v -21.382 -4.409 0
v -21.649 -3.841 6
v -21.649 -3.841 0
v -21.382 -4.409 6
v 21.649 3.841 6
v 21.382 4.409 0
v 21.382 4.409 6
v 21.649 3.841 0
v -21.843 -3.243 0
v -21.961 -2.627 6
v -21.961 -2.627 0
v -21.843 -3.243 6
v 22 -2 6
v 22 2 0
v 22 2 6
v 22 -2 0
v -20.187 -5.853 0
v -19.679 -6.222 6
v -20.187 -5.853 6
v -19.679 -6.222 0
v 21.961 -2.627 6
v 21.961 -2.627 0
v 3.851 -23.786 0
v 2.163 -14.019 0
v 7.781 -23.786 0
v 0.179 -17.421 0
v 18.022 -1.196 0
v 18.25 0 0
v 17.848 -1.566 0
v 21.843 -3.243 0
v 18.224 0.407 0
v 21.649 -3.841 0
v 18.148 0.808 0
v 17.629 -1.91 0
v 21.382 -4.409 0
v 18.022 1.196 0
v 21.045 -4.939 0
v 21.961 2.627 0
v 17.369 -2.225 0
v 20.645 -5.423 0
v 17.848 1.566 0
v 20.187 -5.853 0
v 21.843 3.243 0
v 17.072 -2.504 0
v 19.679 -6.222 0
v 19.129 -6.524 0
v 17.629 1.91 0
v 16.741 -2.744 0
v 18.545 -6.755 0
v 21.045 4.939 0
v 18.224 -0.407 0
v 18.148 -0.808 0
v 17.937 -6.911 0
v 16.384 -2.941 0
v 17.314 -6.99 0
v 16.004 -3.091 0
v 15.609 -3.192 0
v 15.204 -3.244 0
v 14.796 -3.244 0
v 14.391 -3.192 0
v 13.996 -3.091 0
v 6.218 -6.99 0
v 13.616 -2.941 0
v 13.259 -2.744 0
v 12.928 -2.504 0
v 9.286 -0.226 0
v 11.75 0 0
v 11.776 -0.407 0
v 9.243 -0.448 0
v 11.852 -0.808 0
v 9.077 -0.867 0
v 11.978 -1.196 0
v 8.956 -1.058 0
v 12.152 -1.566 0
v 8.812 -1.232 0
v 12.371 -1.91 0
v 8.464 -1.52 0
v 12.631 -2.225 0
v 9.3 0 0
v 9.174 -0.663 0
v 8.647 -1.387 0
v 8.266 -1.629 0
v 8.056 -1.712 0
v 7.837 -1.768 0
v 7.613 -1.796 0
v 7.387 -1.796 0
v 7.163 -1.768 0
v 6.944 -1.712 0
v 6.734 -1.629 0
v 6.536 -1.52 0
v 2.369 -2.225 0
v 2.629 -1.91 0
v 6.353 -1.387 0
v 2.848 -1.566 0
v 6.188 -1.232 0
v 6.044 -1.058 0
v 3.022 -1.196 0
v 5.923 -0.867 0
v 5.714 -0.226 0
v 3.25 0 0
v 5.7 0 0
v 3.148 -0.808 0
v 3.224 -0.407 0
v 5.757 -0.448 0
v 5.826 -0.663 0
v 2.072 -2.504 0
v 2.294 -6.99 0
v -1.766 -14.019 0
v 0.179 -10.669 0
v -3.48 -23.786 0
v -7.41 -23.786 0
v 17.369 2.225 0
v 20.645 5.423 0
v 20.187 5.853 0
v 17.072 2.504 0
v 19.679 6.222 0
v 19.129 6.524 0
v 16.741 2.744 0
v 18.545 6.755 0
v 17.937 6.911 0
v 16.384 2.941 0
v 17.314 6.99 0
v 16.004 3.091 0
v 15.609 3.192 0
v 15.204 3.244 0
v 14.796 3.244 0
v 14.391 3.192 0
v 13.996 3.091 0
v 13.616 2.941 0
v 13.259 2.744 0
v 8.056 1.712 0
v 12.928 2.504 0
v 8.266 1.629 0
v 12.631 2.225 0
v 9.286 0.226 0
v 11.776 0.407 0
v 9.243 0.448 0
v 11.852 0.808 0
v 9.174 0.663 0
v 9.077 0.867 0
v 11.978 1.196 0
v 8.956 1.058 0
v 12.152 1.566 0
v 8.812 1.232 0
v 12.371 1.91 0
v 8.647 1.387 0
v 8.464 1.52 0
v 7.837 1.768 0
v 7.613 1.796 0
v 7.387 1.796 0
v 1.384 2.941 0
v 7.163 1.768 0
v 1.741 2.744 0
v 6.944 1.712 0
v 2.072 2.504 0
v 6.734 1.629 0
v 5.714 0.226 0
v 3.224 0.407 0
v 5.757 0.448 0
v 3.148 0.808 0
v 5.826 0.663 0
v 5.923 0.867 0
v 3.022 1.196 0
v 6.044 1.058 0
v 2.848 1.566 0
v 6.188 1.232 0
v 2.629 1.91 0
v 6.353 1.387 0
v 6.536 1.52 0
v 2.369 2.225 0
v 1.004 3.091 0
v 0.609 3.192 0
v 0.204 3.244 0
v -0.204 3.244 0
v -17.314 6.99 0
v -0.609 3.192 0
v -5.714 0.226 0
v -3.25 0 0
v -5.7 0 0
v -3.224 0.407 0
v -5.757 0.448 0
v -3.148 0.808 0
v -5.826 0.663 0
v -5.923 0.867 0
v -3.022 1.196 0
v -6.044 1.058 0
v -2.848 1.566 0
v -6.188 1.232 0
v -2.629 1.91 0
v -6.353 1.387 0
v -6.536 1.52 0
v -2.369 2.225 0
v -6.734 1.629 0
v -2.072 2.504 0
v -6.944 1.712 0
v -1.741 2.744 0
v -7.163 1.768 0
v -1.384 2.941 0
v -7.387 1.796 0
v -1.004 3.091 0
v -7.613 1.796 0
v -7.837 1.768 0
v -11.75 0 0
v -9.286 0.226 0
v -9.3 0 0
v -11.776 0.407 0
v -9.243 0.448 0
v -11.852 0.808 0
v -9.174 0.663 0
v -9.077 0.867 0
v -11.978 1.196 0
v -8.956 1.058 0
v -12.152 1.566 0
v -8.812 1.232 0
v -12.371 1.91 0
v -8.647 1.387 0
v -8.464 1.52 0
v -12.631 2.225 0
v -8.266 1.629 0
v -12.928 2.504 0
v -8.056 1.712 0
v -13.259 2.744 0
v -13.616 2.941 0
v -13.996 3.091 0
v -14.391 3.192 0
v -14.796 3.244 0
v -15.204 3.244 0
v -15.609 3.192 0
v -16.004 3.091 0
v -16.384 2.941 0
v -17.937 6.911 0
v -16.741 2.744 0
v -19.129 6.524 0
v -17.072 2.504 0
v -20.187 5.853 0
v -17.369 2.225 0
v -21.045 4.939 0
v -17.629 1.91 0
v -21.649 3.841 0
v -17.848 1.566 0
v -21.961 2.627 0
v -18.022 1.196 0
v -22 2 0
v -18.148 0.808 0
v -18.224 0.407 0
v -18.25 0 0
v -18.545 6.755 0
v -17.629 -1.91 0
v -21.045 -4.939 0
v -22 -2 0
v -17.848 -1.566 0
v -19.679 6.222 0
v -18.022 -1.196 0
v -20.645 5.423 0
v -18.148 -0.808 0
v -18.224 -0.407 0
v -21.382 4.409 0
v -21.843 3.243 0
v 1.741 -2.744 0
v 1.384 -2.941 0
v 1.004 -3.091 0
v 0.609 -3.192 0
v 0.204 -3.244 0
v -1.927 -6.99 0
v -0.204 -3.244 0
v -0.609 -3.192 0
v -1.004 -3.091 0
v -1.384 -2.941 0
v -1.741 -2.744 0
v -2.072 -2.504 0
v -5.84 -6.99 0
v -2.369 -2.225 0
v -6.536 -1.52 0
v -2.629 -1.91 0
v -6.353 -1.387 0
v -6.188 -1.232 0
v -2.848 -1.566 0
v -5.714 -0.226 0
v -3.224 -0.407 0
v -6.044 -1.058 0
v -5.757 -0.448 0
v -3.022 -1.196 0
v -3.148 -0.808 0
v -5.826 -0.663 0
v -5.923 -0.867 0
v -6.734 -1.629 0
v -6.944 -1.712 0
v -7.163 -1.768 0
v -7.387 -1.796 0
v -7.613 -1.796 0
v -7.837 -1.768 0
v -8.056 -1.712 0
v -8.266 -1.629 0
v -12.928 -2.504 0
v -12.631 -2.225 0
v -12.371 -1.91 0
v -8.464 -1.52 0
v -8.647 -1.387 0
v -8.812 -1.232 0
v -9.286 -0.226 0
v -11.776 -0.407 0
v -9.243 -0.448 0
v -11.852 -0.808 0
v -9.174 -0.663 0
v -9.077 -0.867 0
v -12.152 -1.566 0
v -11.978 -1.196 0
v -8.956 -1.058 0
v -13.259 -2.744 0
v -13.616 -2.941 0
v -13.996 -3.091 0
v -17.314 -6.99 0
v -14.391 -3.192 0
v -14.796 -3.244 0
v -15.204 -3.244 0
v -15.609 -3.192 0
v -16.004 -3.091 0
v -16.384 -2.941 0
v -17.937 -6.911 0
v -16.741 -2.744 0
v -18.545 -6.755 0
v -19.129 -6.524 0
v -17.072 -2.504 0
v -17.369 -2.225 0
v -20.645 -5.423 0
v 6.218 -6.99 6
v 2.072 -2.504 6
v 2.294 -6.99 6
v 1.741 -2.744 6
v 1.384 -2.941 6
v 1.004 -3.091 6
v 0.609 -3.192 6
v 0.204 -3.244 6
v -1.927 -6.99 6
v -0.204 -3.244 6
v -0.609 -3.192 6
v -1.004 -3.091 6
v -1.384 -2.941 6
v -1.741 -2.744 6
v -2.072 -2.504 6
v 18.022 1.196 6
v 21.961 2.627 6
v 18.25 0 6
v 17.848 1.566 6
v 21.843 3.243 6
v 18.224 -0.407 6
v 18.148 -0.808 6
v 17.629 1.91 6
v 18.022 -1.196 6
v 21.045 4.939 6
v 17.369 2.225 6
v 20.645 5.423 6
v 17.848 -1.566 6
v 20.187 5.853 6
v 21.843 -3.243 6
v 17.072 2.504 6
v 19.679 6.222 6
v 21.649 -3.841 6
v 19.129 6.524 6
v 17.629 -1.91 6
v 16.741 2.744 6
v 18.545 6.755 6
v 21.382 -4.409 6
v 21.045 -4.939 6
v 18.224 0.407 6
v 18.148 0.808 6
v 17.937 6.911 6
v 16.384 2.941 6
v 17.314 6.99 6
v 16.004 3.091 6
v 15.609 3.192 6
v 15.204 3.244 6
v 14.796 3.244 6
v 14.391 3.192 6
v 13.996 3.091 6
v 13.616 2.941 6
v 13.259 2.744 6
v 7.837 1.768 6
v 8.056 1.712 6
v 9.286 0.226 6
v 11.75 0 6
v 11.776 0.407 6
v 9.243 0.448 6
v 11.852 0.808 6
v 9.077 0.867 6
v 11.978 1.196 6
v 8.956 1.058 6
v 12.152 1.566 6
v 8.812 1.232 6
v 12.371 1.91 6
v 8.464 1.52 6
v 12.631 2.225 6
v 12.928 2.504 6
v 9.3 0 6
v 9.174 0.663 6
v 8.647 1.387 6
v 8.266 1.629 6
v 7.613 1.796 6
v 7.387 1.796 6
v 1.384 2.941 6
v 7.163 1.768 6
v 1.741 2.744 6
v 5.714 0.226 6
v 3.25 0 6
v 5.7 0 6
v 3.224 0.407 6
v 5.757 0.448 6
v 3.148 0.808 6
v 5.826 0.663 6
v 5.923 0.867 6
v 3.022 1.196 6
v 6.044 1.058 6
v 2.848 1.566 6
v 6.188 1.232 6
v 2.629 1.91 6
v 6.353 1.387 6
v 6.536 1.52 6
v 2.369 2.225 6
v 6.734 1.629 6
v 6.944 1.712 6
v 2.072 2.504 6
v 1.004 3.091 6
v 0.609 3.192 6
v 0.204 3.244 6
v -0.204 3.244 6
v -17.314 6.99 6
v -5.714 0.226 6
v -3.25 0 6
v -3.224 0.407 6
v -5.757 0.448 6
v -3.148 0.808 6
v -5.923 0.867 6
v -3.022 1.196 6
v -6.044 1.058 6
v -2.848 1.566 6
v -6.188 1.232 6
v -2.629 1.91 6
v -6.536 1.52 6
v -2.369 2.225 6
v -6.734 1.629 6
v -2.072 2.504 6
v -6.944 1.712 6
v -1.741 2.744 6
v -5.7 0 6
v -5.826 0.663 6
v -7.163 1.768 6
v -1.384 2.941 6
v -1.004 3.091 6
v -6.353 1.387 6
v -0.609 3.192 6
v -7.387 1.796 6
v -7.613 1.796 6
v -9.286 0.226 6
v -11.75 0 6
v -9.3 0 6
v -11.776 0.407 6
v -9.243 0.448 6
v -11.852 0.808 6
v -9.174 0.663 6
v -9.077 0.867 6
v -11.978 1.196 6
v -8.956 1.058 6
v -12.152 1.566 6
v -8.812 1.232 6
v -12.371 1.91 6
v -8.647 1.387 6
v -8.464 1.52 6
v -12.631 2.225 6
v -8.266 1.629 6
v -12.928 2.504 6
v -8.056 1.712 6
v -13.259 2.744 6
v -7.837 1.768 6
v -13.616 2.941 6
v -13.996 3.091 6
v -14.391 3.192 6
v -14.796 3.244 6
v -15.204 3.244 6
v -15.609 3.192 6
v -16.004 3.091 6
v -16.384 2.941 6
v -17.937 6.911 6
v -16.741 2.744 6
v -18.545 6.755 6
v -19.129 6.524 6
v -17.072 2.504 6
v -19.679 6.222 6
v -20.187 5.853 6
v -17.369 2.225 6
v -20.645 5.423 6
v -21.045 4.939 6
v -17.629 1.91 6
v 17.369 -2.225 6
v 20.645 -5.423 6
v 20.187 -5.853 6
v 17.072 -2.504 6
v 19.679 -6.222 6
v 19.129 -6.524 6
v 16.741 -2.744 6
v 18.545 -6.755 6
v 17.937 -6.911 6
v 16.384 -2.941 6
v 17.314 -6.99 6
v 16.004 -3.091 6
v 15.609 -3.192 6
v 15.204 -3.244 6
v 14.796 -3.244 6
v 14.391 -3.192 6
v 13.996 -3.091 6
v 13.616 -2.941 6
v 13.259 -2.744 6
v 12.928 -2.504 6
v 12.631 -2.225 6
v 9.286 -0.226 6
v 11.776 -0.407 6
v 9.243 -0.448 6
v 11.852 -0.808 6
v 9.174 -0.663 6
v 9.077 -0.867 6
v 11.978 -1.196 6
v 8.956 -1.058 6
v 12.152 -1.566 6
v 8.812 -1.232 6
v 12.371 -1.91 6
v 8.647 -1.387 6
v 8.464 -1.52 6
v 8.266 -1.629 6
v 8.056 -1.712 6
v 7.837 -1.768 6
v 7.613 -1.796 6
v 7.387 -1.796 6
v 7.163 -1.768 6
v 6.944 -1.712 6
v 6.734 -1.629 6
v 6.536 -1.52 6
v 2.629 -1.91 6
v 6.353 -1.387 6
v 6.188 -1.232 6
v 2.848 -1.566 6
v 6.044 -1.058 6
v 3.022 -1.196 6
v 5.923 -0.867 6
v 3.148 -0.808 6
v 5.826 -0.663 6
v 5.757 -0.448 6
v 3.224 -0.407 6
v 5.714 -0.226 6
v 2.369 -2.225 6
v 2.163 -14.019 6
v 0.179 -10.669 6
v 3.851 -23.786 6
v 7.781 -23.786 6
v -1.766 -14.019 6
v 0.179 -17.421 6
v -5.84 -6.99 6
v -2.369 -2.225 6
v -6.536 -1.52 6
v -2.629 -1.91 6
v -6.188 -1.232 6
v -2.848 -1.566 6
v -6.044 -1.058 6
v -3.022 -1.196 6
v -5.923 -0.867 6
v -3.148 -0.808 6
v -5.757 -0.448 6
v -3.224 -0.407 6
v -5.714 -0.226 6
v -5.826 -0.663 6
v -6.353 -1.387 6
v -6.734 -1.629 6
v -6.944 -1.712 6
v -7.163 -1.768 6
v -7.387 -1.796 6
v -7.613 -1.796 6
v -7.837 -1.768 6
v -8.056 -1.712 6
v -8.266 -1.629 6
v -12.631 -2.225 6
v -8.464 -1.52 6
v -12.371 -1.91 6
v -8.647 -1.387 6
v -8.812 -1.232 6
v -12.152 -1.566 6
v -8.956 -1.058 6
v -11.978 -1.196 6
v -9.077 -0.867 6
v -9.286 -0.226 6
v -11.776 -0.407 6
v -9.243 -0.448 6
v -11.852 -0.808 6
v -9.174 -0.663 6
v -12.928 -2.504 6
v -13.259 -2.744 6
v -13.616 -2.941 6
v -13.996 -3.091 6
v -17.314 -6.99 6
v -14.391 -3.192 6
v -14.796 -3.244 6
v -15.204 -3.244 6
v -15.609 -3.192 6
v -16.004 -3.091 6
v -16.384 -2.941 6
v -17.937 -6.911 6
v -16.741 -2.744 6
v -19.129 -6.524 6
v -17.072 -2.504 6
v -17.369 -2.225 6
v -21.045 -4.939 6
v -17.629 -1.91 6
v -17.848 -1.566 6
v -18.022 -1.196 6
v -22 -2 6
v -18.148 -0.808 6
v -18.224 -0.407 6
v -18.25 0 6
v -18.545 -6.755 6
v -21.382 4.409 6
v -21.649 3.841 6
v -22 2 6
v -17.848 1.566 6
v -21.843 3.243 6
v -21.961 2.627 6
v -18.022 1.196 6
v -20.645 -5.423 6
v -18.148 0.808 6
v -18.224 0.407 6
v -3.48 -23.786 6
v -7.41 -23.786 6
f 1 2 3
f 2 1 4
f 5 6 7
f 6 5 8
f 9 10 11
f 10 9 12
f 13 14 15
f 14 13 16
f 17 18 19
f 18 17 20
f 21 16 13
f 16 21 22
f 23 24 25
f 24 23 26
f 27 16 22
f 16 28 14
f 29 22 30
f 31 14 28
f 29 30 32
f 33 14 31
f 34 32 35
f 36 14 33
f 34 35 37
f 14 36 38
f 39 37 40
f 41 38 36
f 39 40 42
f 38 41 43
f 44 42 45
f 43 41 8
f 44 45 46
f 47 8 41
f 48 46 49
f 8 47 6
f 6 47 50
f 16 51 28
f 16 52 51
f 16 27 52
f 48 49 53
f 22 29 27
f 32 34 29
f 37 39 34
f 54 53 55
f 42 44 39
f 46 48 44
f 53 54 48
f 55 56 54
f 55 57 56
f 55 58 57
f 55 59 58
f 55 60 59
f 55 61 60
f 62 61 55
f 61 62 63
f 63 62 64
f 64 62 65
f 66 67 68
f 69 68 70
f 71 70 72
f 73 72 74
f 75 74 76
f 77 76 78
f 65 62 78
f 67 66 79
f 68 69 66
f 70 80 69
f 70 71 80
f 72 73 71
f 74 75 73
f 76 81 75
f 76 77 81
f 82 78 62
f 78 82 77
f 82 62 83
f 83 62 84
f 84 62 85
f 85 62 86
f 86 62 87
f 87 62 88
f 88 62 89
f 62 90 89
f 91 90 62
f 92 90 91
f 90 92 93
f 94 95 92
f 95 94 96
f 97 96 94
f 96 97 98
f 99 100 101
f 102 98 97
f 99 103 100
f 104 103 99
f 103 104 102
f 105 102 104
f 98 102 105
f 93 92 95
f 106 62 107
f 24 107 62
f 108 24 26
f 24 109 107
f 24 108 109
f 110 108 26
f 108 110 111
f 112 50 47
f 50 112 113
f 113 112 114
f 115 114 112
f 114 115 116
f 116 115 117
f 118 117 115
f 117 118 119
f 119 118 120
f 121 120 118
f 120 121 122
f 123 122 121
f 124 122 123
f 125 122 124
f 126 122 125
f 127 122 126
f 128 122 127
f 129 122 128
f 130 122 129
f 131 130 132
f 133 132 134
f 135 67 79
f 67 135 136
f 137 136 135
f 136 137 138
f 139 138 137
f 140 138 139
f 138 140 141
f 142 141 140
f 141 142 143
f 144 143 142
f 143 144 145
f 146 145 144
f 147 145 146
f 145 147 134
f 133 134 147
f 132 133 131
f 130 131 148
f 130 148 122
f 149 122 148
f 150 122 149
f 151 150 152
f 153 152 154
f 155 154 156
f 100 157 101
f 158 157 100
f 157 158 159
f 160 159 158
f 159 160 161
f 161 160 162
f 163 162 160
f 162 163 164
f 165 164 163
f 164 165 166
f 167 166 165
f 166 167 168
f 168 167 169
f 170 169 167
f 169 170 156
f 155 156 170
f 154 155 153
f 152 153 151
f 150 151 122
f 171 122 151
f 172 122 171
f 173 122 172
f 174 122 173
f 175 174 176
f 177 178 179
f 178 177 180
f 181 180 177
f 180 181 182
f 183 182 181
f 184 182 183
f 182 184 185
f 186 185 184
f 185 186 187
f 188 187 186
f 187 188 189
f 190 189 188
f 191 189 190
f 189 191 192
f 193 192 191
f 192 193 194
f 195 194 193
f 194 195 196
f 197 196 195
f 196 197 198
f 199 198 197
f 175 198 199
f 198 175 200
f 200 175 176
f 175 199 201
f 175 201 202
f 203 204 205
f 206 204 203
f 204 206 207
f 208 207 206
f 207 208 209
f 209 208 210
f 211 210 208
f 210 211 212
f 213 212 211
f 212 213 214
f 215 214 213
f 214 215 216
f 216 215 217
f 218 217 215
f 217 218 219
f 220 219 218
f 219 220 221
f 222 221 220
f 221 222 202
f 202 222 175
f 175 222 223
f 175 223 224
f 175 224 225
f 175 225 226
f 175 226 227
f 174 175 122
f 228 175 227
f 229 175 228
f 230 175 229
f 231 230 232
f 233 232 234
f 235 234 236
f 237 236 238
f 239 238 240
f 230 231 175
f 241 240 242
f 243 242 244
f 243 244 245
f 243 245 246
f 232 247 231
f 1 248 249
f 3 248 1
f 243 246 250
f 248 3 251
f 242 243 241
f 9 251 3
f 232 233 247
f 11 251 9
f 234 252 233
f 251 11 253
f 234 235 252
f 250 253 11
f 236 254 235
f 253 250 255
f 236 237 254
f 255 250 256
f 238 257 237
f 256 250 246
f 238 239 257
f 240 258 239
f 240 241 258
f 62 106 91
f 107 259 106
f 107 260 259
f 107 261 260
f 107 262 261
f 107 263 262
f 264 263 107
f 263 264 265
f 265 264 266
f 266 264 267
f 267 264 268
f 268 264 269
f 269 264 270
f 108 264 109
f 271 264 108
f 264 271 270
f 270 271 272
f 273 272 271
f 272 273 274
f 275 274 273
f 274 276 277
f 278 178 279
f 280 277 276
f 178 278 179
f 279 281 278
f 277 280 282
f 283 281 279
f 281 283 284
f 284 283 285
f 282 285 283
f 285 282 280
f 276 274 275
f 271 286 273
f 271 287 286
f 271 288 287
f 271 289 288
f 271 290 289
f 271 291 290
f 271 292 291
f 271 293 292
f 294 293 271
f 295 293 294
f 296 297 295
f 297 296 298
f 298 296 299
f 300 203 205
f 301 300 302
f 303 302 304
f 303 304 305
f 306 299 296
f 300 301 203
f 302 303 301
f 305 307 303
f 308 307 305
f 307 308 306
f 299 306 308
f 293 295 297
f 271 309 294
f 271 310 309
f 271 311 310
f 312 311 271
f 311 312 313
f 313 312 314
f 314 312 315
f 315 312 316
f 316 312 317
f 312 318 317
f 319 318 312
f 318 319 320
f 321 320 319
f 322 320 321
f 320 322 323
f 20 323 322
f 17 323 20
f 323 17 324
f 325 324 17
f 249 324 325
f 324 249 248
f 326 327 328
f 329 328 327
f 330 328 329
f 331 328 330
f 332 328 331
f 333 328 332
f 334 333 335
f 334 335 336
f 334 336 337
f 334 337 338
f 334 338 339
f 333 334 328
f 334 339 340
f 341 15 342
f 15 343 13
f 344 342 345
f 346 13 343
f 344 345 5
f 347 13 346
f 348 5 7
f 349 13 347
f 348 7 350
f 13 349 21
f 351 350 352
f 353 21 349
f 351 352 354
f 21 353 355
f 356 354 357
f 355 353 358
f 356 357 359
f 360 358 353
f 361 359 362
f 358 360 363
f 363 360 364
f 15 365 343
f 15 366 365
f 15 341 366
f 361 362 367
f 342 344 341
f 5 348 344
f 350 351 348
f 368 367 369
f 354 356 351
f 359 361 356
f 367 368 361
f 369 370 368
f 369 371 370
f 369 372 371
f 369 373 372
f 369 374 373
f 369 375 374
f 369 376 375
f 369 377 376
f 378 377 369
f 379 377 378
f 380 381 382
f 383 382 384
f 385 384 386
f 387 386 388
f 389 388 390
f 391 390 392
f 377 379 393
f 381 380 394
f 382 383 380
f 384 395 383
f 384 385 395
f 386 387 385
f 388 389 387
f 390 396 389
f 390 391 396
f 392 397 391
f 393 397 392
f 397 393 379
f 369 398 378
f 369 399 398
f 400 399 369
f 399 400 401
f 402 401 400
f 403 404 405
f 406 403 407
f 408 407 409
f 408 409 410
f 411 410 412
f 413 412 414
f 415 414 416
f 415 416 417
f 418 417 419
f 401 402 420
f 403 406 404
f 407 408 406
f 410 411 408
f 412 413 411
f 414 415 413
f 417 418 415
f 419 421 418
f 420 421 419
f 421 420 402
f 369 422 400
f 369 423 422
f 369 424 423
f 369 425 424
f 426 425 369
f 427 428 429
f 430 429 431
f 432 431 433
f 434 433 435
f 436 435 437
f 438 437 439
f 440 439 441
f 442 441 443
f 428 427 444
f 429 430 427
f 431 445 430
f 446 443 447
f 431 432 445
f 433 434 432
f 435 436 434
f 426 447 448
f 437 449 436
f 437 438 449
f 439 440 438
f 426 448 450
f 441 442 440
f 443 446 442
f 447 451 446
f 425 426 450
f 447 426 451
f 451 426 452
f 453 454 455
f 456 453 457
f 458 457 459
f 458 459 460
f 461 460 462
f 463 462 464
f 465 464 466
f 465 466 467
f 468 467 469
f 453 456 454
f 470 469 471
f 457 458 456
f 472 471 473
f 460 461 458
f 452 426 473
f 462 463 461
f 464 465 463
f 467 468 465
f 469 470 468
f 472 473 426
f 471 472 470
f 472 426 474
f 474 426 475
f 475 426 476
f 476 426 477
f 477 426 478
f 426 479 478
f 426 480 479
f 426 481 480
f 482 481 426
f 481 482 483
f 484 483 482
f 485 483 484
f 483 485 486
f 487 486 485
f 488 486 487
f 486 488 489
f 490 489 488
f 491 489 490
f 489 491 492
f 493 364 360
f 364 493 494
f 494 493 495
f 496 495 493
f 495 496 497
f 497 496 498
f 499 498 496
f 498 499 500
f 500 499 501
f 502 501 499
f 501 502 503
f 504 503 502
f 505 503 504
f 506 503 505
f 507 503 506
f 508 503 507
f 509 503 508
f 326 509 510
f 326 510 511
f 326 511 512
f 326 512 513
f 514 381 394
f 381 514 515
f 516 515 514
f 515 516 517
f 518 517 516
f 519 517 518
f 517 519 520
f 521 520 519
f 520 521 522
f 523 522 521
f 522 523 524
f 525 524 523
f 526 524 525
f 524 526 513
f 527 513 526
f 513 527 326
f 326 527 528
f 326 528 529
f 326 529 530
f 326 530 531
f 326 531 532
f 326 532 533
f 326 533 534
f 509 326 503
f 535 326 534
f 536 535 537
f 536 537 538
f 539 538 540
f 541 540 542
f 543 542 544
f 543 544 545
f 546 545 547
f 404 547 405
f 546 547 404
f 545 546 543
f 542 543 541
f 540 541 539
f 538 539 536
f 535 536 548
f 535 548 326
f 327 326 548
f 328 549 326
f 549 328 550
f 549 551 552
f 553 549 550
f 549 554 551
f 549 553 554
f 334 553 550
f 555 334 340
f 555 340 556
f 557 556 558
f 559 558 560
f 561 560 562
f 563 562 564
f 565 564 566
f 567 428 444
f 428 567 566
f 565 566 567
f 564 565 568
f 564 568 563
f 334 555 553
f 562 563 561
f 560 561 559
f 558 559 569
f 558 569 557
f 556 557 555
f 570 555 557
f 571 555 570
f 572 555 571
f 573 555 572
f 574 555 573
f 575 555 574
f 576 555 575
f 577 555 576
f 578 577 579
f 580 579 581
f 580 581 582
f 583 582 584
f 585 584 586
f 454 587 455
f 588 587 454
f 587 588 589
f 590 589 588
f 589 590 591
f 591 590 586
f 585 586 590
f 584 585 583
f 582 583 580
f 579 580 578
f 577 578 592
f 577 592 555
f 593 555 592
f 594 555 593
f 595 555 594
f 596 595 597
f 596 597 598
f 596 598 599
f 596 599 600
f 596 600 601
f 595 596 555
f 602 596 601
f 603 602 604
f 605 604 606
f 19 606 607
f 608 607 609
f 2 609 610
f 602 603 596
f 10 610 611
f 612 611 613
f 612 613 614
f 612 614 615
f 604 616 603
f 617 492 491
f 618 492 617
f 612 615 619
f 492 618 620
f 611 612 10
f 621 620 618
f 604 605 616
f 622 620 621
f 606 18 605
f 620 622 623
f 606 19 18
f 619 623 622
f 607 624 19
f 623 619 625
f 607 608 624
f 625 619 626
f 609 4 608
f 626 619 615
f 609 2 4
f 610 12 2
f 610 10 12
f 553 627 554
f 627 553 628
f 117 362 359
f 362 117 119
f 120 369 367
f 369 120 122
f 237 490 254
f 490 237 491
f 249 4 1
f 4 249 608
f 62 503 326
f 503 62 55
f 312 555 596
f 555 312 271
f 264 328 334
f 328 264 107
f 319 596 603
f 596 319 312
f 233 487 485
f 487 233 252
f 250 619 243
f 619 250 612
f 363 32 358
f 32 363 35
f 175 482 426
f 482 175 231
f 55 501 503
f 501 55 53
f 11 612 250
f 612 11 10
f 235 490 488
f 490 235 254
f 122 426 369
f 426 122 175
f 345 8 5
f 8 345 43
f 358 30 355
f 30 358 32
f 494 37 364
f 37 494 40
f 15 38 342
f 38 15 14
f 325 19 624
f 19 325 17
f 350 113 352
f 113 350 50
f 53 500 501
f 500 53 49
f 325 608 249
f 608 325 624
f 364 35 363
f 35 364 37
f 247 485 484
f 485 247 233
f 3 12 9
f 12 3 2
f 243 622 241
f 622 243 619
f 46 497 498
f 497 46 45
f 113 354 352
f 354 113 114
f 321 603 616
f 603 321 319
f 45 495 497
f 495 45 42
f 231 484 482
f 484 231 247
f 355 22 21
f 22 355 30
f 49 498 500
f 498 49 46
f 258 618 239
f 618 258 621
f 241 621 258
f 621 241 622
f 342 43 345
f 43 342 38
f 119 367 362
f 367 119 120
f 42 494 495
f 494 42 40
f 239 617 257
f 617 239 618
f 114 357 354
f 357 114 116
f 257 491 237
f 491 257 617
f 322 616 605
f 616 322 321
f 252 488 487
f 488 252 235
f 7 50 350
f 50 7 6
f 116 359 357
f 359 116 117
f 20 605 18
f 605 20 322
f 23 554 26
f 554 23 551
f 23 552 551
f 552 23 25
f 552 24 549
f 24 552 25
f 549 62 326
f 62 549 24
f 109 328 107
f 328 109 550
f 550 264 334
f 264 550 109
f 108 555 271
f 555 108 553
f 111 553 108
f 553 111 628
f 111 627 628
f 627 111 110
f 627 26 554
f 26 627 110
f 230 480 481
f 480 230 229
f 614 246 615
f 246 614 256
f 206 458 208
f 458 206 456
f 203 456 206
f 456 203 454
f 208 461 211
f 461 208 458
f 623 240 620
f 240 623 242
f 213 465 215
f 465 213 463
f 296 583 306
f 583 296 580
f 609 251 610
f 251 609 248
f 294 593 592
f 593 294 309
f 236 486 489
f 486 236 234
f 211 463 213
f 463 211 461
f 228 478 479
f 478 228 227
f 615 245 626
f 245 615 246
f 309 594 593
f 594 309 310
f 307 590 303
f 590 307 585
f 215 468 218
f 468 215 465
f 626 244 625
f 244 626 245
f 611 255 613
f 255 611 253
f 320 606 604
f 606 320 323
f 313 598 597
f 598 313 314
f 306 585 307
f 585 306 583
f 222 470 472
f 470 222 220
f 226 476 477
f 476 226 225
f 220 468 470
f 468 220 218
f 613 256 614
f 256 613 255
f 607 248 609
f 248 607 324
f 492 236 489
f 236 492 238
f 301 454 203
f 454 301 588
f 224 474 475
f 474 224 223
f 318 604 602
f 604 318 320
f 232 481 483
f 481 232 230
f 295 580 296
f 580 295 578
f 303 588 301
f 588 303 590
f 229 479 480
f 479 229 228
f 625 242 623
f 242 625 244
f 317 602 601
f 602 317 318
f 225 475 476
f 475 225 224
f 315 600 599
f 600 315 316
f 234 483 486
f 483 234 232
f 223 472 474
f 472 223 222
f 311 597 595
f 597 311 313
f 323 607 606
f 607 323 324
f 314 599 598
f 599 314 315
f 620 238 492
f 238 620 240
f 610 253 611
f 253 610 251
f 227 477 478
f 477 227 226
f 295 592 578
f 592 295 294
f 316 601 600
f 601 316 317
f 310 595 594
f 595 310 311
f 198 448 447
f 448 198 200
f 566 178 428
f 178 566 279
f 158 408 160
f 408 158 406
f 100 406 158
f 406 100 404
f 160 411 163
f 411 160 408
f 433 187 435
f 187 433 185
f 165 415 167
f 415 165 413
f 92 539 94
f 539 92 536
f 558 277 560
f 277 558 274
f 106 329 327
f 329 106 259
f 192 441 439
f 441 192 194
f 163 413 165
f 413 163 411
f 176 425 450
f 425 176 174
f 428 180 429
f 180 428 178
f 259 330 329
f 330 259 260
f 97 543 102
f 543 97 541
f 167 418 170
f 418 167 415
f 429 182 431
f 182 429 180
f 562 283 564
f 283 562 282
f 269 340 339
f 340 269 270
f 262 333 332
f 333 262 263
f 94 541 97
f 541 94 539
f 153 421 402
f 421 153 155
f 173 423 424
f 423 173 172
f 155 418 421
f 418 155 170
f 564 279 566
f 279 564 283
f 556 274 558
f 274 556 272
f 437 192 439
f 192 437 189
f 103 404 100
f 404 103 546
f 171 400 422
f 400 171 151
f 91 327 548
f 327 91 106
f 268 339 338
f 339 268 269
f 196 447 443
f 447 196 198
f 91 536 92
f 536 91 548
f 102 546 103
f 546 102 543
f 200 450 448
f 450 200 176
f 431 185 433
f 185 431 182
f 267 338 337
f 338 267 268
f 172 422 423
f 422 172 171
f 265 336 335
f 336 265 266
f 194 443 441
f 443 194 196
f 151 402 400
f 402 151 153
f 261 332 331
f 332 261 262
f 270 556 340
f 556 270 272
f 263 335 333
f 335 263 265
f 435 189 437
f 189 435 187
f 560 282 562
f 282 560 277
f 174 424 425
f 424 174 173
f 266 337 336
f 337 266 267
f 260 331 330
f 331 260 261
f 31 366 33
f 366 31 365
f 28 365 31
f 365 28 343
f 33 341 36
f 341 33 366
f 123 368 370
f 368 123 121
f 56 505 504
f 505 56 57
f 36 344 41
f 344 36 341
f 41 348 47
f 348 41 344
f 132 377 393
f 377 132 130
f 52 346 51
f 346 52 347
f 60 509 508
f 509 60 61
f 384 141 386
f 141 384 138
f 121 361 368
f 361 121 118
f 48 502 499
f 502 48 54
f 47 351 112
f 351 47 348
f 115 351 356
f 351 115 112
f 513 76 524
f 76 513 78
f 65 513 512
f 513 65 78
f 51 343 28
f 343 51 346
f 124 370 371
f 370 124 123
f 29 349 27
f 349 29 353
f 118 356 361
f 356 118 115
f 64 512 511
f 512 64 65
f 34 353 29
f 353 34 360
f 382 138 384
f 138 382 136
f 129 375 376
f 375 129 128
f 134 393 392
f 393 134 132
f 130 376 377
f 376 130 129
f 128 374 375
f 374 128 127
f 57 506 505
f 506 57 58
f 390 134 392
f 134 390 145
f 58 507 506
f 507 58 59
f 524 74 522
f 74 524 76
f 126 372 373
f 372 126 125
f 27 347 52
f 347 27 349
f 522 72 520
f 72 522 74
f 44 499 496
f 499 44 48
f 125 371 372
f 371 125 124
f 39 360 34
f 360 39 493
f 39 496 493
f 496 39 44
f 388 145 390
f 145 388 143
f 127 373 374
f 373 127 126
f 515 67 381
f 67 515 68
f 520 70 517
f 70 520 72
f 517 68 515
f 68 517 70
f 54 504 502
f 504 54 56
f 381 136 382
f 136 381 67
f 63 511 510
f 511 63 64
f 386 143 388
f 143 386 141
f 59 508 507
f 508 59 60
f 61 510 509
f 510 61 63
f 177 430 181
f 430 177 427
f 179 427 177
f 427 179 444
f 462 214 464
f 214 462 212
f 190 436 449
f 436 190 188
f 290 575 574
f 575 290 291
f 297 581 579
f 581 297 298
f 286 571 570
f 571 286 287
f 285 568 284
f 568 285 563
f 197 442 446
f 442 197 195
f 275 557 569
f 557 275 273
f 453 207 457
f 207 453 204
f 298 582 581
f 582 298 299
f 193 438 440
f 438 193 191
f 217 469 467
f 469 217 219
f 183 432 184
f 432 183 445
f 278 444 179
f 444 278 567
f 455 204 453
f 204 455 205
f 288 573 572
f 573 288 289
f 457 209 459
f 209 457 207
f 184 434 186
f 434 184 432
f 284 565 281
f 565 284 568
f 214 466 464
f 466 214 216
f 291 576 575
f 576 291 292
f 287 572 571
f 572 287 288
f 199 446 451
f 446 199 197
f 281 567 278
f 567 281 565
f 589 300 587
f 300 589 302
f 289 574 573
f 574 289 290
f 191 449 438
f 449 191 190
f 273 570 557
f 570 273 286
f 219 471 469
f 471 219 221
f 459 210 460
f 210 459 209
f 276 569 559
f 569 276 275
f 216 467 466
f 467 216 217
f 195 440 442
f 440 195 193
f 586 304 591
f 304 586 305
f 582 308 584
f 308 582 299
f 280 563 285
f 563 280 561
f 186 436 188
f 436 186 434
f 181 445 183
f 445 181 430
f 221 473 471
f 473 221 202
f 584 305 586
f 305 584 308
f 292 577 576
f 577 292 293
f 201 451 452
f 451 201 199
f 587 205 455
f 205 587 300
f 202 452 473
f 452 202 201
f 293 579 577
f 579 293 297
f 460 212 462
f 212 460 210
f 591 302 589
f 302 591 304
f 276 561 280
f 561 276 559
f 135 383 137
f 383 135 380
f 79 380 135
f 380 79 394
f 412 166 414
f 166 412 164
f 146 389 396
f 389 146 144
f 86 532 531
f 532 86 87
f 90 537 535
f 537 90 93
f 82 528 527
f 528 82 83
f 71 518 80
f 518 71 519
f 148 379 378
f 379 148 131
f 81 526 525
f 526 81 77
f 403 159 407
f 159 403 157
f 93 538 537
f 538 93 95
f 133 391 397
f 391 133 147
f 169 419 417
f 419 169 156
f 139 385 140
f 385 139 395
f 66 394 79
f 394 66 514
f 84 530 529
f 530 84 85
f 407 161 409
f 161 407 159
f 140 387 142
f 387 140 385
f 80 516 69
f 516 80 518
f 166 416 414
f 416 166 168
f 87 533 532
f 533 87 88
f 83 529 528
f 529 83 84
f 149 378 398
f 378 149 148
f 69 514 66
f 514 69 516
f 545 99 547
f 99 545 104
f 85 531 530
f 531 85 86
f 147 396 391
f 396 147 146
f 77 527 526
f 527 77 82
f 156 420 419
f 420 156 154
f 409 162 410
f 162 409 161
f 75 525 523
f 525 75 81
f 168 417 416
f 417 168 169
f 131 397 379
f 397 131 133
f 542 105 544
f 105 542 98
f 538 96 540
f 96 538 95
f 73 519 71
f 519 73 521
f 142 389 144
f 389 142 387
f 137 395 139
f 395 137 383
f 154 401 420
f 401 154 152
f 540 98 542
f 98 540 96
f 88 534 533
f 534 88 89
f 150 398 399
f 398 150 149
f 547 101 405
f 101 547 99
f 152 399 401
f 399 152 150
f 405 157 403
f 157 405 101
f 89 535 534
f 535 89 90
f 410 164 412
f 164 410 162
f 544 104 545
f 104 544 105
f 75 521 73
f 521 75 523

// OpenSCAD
$fn = 50;


difference() {
	union() {
		hull() {
			translate(v = [-17.0000000000, 2.0000000000, 0]) {
				cylinder(h = 6, r = 5);
			}
			translate(v = [17.0000000000, 2.0000000000, 0]) {
				cylinder(h = 6, r = 5);
			}
			translate(v = [-17.0000000000, -2.0000000000, 0]) {
				cylinder(h = 6, r = 5);
			}
			translate(v = [17.0000000000, -2.0000000000, 0]) {
				cylinder(h = 6, r = 5);
			}
		}
		translate(v = [0, -5, 0]) {
			linear_extrude(height = 6) {
				text(font = "DejaVu Sans Mono:style=Bold", halign = "center", size = 19.0000000000, text = "X", valign = "top");
			}
		}
	}
	union() {
		translate(v = [-15.0000000000, 0.0000000000, 0]) {
			translate(v = [0, 0, -100]) {
				cylinder(h = 200, r = 3.2500000000);
			}
		}
		translate(v = [0, 0, -100]) {
			cylinder(h = 200, r = 3.2500000000);
		}
		translate(v = [15.0000000000, 0.0000000000, 0]) {
			translate(v = [0, 0, -100]) {
				cylinder(h = 200, r = 3.2500000000);
			}
		}
		translate(v = [-15.0000000000, 0.0000000000, 0]) {
			translate(v = [0, 0, -100]) {
				cylinder(h = 200, r = 1.8000000000);
			}
		}
		translate(v = [-7.5000000000, 0.0000000000, 0]) {
			translate(v = [0, 0, -100]) {
				cylinder(h = 200, r = 1.8000000000);
			}
		}
		translate(v = [0, 0, -100]) {
			cylinder(h = 200, r = 1.8000000000);
		}
		translate(v = [7.5000000000, 0.0000000000, 0]) {
			translate(v = [0, 0, -100]) {
				cylinder(h = 200, r = 1.8000000000);
			}
		}
		translate(v = [15.0000000000, 0.0000000000, 0]) {
			translate(v = [0, 0, -100]) {
				cylinder(h = 200, r = 1.8000000000);
			}
		}
	}
}
